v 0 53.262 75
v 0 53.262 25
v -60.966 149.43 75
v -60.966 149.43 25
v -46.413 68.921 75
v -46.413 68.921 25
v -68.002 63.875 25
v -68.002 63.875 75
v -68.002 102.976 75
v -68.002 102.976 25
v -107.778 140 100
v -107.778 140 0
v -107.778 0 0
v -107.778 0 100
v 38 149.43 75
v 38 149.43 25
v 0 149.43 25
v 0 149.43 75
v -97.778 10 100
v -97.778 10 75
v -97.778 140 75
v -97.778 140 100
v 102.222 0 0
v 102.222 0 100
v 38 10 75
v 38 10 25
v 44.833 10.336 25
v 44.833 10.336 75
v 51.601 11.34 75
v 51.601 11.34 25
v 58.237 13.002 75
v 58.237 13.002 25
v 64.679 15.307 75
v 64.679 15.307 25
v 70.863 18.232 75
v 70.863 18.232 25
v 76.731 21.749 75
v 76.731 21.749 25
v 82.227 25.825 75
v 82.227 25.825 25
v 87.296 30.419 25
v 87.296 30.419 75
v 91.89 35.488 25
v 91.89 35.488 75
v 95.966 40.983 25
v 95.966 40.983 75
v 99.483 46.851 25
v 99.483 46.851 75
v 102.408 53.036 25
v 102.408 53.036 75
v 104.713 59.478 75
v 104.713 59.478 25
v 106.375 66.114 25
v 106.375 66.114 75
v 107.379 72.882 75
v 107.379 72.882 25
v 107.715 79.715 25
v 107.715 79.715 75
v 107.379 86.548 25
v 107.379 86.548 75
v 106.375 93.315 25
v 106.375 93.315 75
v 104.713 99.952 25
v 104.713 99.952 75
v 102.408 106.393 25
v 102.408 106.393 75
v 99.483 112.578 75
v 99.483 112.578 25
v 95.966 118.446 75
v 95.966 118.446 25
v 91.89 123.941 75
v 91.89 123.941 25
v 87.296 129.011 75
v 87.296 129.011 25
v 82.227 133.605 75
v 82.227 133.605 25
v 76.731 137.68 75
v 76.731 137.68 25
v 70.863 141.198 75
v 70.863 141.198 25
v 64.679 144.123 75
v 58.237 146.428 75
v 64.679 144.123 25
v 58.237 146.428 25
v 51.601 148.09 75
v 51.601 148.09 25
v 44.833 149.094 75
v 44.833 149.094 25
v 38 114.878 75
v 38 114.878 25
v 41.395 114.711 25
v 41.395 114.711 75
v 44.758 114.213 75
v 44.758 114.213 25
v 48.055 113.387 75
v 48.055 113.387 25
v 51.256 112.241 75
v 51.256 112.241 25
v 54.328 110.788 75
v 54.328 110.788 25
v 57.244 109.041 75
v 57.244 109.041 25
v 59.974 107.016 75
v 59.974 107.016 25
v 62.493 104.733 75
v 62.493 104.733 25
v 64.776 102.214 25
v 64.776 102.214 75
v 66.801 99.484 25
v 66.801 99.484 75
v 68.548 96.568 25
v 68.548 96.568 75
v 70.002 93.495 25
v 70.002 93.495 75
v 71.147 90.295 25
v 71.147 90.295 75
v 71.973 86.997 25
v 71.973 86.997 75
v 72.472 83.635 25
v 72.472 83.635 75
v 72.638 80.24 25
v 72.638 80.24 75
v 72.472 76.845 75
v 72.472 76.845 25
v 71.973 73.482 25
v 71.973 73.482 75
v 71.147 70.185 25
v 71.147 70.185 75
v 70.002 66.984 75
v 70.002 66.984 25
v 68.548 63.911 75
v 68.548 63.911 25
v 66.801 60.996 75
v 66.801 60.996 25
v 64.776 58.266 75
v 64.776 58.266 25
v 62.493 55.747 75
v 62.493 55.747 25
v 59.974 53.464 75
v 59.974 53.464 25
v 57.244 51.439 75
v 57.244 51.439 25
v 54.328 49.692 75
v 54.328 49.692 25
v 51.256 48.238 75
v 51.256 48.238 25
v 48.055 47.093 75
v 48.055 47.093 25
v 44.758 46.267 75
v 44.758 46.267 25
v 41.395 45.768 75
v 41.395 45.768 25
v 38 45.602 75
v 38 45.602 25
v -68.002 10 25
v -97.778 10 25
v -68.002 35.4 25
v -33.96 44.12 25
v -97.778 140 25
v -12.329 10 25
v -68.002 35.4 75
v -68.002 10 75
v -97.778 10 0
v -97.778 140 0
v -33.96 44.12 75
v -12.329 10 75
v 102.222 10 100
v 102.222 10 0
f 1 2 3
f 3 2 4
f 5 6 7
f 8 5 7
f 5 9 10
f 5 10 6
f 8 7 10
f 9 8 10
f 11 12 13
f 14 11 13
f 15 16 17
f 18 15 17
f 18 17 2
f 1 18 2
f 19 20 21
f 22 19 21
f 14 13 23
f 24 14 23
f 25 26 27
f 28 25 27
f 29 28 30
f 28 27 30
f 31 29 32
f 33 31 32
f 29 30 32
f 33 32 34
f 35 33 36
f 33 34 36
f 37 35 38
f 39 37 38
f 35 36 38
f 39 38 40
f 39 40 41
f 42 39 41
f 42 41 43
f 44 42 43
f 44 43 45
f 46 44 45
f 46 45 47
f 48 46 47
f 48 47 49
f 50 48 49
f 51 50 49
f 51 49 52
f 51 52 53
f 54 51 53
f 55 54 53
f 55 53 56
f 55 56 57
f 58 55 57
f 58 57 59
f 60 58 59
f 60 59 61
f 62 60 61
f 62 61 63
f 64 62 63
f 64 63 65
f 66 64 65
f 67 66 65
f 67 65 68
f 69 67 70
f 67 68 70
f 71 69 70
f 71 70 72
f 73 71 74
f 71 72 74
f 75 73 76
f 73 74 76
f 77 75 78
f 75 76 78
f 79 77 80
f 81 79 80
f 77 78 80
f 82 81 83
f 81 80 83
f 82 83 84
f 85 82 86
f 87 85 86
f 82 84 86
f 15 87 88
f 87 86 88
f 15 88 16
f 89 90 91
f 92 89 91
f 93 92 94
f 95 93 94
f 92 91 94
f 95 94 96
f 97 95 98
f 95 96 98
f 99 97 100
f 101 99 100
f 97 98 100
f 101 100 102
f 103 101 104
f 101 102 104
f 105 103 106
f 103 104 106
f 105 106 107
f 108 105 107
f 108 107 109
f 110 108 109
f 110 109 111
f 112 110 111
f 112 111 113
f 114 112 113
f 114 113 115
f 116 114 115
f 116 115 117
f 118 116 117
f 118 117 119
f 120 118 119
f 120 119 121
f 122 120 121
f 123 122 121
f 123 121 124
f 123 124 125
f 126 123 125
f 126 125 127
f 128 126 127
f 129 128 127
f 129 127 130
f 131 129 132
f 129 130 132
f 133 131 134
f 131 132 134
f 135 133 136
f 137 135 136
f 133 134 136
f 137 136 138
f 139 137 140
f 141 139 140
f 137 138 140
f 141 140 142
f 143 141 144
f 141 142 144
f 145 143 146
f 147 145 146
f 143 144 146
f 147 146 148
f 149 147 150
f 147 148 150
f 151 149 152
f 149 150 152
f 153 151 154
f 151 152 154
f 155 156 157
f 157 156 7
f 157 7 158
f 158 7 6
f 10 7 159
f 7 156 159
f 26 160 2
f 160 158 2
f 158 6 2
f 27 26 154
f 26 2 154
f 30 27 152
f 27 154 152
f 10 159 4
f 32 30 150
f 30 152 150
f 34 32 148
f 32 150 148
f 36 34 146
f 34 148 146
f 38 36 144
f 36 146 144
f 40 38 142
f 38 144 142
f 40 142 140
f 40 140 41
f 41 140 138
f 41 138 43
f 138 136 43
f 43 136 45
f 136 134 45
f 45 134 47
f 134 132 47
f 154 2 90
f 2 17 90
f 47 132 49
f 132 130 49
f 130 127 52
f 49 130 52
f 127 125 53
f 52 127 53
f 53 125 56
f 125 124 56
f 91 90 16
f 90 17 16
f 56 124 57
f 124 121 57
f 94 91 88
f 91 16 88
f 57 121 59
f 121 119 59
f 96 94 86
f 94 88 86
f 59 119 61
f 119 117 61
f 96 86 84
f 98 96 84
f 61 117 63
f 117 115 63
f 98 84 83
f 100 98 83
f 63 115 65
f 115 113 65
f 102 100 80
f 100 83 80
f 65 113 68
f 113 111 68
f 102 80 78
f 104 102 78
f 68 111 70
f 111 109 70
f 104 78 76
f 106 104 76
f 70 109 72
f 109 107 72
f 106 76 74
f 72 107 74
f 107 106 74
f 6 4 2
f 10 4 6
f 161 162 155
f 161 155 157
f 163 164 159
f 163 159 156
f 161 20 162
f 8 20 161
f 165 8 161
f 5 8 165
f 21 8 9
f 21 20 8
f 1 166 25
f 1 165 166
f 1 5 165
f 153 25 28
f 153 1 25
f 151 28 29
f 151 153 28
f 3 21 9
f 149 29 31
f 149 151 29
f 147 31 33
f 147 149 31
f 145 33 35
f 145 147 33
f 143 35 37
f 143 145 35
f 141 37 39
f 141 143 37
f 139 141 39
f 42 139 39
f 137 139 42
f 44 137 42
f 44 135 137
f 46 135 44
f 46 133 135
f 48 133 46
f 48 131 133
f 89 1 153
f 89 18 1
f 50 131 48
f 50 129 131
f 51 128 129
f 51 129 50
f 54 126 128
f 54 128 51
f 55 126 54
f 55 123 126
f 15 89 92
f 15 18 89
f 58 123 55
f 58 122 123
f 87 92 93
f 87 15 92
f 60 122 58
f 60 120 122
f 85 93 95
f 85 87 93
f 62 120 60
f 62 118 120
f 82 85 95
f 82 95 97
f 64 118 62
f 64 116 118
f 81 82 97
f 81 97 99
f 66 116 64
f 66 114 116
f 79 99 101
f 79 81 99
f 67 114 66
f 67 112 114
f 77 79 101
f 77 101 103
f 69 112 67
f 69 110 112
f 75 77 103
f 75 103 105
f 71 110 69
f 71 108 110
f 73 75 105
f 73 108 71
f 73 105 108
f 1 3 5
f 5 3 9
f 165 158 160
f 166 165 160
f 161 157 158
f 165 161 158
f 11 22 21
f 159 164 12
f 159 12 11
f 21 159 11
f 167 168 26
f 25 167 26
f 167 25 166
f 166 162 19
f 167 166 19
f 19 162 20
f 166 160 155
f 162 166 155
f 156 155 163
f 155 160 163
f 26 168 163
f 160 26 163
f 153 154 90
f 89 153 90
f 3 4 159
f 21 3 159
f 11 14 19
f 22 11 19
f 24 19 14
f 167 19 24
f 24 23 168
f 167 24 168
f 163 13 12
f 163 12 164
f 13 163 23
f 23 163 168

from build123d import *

# Parameters (mm, degrees)
F1_DEPTH = 100
F2_DEPTH = 75
F3_DEPTH = 25


with BuildPart() as f1:
    # F0 (on Top) → F1 (new body)
    with BuildSketch(Plane.XY):
        Polygon((-107.777781, 0), (-97.777781, 0), (102.222219, 0), (102.222219, 10), (38, 10), (-12.328933, 10), (-68.002172, 10), (-97.777781, 10), (-97.777781, 140), (-107.777781, 140), align=None)
    extrude(amount=F1_DEPTH)

    # F0 (on Top) → F2 (join)
    with BuildSketch(Plane.XY):
        with BuildLine():
            Line((-12.328933, 10), (38, 10))
            ThreePointArc((38, 10), (107.714757, 79.714757), (38, 149.429513))
            Line((38, 149.429513), (0, 149.429513))
            Line((0, 149.429513), (0, 53.262483))
            Line((0, 53.262483), (-60.966311, 149.429513))
            Line((-60.966311, 149.429513), (-97.777781, 140))
            Line((-97.777781, 140), (-97.777781, 10))
            Line((-97.777781, 10), (-68.002172, 10))
            Line((-68.002172, 10), (-68.002172, 35.399918))
            Line((-68.002172, 35.399918), (-33.959807, 44.120105))
            Line((-33.959807, 44.120105), (-12.328933, 10))
        make_face()
        Polygon((-46.412745, 68.920866), (-68.002172, 63.875206), (-68.002172, 102.975592), align=None, mode=Mode.SUBTRACT)
        with BuildLine():
            Line((38, 45.601577), (38, 114.87817))
            ThreePointArc((38, 114.87817), (72.638297, 80.239873), (38, 45.601577))
        make_face(mode=Mode.SUBTRACT)
    extrude(amount=F2_DEPTH)

    # F0 (on Top) → F3 (cut)
    with BuildSketch(Plane.XY):
        with BuildLine():
            Line((-12.328933, 10), (38, 10))
            ThreePointArc((38, 10), (107.714757, 79.714757), (38, 149.429513))
            Line((38, 149.429513), (0, 149.429513))
            Line((0, 149.429513), (0, 53.262483))
            Line((0, 53.262483), (-60.966311, 149.429513))
            Line((-60.966311, 149.429513), (-97.777781, 140))
            Line((-97.777781, 140), (-97.777781, 10))
            Line((-97.777781, 10), (-68.002172, 10))
            Line((-68.002172, 10), (-68.002172, 35.399918))
            Line((-68.002172, 35.399918), (-33.959807, 44.120105))
            Line((-33.959807, 44.120105), (-12.328933, 10))
        make_face()
        Polygon((-46.412745, 68.920866), (-68.002172, 63.875206), (-68.002172, 102.975592), align=None, mode=Mode.SUBTRACT)
        with BuildLine():
            Line((38, 45.601577), (38, 114.87817))
            ThreePointArc((38, 114.87817), (72.638297, 80.239873), (38, 45.601577))
        make_face(mode=Mode.SUBTRACT)
    extrude(amount=F3_DEPTH, mode=Mode.SUBTRACT)


solid = f1.part
